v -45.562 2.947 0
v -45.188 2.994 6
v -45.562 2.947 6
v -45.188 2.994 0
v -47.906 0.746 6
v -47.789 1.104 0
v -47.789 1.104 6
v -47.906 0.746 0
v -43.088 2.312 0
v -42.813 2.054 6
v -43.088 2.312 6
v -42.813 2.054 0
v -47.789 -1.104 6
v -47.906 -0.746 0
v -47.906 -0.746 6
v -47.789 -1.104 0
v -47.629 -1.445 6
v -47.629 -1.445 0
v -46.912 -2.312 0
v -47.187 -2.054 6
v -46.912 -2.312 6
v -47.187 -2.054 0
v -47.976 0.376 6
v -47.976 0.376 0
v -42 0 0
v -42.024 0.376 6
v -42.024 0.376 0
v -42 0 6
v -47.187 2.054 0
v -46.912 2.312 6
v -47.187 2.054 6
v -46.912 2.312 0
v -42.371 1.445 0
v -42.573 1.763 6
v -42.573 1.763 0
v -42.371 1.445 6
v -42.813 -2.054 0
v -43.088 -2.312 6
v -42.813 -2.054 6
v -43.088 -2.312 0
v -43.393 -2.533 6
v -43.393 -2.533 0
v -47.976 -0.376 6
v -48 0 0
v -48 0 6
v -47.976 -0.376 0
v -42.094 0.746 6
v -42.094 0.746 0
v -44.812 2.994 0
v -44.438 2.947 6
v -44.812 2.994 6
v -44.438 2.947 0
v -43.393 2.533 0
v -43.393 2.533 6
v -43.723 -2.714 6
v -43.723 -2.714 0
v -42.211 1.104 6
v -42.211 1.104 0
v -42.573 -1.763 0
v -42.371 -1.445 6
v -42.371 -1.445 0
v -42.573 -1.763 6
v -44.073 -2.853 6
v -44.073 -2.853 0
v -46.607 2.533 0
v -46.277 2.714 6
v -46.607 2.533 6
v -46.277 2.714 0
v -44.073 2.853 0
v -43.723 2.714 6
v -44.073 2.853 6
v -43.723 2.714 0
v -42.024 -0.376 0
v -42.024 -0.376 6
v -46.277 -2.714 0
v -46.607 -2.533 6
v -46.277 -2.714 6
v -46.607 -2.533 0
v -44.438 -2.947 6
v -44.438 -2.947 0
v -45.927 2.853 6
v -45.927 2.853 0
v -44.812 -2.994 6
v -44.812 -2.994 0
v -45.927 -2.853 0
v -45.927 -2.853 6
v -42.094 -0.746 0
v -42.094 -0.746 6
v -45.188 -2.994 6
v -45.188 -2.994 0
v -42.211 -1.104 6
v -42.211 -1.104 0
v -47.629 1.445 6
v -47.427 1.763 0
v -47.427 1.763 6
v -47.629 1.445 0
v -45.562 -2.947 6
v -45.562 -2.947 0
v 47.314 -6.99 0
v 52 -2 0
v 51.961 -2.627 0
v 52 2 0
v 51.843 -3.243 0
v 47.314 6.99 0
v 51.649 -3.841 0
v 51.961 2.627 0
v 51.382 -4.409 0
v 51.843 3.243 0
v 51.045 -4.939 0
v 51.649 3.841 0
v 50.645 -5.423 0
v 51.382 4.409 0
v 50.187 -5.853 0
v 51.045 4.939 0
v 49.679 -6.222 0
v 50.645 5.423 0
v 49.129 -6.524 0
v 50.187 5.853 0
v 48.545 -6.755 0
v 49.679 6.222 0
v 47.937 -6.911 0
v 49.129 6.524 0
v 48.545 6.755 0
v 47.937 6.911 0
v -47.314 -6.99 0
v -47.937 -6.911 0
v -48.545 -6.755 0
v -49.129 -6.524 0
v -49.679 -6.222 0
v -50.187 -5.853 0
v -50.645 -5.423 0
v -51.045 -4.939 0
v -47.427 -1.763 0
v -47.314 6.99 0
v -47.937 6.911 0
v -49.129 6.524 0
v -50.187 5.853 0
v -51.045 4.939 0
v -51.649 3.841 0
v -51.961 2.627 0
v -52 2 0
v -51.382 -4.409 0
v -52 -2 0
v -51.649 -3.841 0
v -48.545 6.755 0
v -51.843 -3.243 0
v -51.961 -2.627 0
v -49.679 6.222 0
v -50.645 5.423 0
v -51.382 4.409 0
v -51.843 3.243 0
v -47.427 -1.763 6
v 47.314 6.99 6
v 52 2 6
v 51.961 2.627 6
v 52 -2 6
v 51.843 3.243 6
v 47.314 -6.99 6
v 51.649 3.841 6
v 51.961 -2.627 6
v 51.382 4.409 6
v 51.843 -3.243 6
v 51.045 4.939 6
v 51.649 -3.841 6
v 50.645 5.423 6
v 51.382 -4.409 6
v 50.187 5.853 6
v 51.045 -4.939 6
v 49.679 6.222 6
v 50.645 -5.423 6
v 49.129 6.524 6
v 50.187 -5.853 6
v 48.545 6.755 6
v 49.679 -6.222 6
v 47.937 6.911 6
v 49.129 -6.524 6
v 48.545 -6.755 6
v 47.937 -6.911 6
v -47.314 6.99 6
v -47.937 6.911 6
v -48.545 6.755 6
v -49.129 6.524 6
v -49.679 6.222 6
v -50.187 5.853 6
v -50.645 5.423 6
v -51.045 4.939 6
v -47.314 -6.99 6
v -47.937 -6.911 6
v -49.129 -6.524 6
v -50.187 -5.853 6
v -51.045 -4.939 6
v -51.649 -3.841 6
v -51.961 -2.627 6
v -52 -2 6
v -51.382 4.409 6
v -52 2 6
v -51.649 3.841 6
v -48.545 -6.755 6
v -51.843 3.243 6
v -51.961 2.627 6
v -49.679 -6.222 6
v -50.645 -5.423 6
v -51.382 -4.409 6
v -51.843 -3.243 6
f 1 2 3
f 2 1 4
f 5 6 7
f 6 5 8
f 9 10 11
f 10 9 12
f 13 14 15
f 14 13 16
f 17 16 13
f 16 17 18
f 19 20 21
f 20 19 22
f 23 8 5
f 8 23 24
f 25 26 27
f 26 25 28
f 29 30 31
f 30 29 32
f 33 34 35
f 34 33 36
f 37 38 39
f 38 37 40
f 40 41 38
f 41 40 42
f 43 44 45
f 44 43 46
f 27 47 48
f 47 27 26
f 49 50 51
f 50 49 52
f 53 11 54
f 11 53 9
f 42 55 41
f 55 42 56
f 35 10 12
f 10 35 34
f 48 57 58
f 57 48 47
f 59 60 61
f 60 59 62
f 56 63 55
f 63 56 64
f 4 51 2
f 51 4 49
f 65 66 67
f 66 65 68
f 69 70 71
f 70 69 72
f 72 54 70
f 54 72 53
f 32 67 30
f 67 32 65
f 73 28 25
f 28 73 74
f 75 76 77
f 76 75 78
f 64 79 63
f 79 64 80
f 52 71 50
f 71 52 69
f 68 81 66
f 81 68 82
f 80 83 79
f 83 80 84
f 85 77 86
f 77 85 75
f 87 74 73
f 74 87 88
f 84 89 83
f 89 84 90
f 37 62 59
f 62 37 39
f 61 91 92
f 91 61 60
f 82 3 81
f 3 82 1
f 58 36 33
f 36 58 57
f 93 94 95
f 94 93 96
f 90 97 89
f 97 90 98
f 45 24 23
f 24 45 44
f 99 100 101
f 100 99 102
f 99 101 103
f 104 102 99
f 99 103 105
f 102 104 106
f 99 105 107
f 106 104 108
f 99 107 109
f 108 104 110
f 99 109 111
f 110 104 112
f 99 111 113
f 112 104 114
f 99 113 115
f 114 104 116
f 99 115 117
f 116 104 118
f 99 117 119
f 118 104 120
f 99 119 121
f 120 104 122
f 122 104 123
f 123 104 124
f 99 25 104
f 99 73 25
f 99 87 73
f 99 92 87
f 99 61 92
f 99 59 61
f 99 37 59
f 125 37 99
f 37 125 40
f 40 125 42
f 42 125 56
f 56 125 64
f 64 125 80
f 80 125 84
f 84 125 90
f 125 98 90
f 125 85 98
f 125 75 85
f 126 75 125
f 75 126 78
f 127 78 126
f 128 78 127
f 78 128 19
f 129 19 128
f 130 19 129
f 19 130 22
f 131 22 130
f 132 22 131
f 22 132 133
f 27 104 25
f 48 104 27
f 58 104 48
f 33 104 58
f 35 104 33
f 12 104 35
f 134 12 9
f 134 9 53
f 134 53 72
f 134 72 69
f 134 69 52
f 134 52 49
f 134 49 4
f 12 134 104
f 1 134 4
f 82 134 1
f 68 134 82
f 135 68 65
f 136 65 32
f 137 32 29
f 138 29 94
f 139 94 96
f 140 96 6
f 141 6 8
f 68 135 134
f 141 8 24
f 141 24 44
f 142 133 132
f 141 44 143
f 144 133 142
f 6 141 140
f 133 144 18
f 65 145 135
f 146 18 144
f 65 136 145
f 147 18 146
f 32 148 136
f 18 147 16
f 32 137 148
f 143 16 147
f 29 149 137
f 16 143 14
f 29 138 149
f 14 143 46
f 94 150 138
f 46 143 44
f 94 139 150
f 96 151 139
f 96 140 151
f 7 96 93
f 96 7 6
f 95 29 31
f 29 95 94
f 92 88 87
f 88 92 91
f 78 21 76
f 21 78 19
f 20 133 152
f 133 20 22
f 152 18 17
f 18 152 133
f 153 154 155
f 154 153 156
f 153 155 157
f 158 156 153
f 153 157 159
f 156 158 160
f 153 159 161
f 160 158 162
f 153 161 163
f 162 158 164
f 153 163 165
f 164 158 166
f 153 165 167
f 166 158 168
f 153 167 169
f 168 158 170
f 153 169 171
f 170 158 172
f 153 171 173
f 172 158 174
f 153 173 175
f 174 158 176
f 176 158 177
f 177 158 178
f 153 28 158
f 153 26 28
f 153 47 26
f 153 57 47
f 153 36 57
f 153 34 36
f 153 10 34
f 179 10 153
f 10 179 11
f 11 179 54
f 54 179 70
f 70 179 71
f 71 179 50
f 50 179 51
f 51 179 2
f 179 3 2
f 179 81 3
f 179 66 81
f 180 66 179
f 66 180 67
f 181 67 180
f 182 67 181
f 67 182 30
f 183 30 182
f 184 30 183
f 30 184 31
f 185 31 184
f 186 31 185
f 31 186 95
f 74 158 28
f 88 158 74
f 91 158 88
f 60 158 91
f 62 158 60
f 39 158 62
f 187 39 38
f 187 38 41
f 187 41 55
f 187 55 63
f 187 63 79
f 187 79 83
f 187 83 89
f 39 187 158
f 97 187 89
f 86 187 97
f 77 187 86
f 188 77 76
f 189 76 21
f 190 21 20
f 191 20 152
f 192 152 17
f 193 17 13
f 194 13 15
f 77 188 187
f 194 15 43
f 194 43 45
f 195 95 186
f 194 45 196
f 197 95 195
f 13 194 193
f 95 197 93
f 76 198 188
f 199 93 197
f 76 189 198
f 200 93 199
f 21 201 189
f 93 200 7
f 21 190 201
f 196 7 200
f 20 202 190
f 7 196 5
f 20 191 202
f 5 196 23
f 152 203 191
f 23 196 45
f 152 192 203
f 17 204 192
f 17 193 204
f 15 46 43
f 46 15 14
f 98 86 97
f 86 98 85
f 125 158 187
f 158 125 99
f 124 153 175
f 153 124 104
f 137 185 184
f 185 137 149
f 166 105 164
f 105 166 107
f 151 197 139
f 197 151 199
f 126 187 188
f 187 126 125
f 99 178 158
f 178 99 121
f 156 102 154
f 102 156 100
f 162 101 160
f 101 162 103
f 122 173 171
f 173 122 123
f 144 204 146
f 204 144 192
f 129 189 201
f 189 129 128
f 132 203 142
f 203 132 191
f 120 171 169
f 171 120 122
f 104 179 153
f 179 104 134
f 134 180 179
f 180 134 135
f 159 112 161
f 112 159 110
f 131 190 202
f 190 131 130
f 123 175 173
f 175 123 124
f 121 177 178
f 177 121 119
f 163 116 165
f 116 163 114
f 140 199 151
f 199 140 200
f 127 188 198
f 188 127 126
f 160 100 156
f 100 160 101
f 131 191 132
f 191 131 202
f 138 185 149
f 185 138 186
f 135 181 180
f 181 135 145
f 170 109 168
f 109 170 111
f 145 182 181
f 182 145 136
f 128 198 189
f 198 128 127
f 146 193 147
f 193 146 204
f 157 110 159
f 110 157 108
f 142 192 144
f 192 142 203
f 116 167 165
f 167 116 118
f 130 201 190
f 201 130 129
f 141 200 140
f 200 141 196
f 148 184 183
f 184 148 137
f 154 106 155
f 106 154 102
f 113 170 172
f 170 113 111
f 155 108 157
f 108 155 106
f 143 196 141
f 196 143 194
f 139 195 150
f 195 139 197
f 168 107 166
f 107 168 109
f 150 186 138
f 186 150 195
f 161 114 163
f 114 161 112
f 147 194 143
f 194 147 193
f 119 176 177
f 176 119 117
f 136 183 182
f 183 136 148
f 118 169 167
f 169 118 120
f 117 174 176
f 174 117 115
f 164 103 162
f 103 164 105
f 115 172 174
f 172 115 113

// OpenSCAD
$fn = 50;


difference() {
	union() {
		hull() {
			translate(v = [-47.0000000000, 2.0000000000, 0]) {
				cylinder(h = 6, r = 5);
			}
			translate(v = [47.0000000000, 2.0000000000, 0]) {
				cylinder(h = 6, r = 5);
			}
			translate(v = [-47.0000000000, -2.0000000000, 0]) {
				cylinder(h = 6, r = 5);
			}
			translate(v = [47.0000000000, -2.0000000000, 0]) {
				cylinder(h = 6, r = 5);
			}
		}
	}
	union() {
		translate(v = [-45.0000000000, 0.0000000000, 0]) {
			cylinder(h = 6, r = 3.0000000000);
		}
		translate(v = [-45.0000000000, 0.0000000000, 0]) {
			cylinder(h = 6, r = 1.5000000000);
		}
		translate(v = [-45.0000000000, 0.0000000000, 0]) {
			cylinder(h = 6, r = 1.5000000000);
		}
		translate(v = [-45.0000000000, 0.0000000000, 0]) {
			cylinder(h = 6, r = 1.5000000000);
		}
	}
}
